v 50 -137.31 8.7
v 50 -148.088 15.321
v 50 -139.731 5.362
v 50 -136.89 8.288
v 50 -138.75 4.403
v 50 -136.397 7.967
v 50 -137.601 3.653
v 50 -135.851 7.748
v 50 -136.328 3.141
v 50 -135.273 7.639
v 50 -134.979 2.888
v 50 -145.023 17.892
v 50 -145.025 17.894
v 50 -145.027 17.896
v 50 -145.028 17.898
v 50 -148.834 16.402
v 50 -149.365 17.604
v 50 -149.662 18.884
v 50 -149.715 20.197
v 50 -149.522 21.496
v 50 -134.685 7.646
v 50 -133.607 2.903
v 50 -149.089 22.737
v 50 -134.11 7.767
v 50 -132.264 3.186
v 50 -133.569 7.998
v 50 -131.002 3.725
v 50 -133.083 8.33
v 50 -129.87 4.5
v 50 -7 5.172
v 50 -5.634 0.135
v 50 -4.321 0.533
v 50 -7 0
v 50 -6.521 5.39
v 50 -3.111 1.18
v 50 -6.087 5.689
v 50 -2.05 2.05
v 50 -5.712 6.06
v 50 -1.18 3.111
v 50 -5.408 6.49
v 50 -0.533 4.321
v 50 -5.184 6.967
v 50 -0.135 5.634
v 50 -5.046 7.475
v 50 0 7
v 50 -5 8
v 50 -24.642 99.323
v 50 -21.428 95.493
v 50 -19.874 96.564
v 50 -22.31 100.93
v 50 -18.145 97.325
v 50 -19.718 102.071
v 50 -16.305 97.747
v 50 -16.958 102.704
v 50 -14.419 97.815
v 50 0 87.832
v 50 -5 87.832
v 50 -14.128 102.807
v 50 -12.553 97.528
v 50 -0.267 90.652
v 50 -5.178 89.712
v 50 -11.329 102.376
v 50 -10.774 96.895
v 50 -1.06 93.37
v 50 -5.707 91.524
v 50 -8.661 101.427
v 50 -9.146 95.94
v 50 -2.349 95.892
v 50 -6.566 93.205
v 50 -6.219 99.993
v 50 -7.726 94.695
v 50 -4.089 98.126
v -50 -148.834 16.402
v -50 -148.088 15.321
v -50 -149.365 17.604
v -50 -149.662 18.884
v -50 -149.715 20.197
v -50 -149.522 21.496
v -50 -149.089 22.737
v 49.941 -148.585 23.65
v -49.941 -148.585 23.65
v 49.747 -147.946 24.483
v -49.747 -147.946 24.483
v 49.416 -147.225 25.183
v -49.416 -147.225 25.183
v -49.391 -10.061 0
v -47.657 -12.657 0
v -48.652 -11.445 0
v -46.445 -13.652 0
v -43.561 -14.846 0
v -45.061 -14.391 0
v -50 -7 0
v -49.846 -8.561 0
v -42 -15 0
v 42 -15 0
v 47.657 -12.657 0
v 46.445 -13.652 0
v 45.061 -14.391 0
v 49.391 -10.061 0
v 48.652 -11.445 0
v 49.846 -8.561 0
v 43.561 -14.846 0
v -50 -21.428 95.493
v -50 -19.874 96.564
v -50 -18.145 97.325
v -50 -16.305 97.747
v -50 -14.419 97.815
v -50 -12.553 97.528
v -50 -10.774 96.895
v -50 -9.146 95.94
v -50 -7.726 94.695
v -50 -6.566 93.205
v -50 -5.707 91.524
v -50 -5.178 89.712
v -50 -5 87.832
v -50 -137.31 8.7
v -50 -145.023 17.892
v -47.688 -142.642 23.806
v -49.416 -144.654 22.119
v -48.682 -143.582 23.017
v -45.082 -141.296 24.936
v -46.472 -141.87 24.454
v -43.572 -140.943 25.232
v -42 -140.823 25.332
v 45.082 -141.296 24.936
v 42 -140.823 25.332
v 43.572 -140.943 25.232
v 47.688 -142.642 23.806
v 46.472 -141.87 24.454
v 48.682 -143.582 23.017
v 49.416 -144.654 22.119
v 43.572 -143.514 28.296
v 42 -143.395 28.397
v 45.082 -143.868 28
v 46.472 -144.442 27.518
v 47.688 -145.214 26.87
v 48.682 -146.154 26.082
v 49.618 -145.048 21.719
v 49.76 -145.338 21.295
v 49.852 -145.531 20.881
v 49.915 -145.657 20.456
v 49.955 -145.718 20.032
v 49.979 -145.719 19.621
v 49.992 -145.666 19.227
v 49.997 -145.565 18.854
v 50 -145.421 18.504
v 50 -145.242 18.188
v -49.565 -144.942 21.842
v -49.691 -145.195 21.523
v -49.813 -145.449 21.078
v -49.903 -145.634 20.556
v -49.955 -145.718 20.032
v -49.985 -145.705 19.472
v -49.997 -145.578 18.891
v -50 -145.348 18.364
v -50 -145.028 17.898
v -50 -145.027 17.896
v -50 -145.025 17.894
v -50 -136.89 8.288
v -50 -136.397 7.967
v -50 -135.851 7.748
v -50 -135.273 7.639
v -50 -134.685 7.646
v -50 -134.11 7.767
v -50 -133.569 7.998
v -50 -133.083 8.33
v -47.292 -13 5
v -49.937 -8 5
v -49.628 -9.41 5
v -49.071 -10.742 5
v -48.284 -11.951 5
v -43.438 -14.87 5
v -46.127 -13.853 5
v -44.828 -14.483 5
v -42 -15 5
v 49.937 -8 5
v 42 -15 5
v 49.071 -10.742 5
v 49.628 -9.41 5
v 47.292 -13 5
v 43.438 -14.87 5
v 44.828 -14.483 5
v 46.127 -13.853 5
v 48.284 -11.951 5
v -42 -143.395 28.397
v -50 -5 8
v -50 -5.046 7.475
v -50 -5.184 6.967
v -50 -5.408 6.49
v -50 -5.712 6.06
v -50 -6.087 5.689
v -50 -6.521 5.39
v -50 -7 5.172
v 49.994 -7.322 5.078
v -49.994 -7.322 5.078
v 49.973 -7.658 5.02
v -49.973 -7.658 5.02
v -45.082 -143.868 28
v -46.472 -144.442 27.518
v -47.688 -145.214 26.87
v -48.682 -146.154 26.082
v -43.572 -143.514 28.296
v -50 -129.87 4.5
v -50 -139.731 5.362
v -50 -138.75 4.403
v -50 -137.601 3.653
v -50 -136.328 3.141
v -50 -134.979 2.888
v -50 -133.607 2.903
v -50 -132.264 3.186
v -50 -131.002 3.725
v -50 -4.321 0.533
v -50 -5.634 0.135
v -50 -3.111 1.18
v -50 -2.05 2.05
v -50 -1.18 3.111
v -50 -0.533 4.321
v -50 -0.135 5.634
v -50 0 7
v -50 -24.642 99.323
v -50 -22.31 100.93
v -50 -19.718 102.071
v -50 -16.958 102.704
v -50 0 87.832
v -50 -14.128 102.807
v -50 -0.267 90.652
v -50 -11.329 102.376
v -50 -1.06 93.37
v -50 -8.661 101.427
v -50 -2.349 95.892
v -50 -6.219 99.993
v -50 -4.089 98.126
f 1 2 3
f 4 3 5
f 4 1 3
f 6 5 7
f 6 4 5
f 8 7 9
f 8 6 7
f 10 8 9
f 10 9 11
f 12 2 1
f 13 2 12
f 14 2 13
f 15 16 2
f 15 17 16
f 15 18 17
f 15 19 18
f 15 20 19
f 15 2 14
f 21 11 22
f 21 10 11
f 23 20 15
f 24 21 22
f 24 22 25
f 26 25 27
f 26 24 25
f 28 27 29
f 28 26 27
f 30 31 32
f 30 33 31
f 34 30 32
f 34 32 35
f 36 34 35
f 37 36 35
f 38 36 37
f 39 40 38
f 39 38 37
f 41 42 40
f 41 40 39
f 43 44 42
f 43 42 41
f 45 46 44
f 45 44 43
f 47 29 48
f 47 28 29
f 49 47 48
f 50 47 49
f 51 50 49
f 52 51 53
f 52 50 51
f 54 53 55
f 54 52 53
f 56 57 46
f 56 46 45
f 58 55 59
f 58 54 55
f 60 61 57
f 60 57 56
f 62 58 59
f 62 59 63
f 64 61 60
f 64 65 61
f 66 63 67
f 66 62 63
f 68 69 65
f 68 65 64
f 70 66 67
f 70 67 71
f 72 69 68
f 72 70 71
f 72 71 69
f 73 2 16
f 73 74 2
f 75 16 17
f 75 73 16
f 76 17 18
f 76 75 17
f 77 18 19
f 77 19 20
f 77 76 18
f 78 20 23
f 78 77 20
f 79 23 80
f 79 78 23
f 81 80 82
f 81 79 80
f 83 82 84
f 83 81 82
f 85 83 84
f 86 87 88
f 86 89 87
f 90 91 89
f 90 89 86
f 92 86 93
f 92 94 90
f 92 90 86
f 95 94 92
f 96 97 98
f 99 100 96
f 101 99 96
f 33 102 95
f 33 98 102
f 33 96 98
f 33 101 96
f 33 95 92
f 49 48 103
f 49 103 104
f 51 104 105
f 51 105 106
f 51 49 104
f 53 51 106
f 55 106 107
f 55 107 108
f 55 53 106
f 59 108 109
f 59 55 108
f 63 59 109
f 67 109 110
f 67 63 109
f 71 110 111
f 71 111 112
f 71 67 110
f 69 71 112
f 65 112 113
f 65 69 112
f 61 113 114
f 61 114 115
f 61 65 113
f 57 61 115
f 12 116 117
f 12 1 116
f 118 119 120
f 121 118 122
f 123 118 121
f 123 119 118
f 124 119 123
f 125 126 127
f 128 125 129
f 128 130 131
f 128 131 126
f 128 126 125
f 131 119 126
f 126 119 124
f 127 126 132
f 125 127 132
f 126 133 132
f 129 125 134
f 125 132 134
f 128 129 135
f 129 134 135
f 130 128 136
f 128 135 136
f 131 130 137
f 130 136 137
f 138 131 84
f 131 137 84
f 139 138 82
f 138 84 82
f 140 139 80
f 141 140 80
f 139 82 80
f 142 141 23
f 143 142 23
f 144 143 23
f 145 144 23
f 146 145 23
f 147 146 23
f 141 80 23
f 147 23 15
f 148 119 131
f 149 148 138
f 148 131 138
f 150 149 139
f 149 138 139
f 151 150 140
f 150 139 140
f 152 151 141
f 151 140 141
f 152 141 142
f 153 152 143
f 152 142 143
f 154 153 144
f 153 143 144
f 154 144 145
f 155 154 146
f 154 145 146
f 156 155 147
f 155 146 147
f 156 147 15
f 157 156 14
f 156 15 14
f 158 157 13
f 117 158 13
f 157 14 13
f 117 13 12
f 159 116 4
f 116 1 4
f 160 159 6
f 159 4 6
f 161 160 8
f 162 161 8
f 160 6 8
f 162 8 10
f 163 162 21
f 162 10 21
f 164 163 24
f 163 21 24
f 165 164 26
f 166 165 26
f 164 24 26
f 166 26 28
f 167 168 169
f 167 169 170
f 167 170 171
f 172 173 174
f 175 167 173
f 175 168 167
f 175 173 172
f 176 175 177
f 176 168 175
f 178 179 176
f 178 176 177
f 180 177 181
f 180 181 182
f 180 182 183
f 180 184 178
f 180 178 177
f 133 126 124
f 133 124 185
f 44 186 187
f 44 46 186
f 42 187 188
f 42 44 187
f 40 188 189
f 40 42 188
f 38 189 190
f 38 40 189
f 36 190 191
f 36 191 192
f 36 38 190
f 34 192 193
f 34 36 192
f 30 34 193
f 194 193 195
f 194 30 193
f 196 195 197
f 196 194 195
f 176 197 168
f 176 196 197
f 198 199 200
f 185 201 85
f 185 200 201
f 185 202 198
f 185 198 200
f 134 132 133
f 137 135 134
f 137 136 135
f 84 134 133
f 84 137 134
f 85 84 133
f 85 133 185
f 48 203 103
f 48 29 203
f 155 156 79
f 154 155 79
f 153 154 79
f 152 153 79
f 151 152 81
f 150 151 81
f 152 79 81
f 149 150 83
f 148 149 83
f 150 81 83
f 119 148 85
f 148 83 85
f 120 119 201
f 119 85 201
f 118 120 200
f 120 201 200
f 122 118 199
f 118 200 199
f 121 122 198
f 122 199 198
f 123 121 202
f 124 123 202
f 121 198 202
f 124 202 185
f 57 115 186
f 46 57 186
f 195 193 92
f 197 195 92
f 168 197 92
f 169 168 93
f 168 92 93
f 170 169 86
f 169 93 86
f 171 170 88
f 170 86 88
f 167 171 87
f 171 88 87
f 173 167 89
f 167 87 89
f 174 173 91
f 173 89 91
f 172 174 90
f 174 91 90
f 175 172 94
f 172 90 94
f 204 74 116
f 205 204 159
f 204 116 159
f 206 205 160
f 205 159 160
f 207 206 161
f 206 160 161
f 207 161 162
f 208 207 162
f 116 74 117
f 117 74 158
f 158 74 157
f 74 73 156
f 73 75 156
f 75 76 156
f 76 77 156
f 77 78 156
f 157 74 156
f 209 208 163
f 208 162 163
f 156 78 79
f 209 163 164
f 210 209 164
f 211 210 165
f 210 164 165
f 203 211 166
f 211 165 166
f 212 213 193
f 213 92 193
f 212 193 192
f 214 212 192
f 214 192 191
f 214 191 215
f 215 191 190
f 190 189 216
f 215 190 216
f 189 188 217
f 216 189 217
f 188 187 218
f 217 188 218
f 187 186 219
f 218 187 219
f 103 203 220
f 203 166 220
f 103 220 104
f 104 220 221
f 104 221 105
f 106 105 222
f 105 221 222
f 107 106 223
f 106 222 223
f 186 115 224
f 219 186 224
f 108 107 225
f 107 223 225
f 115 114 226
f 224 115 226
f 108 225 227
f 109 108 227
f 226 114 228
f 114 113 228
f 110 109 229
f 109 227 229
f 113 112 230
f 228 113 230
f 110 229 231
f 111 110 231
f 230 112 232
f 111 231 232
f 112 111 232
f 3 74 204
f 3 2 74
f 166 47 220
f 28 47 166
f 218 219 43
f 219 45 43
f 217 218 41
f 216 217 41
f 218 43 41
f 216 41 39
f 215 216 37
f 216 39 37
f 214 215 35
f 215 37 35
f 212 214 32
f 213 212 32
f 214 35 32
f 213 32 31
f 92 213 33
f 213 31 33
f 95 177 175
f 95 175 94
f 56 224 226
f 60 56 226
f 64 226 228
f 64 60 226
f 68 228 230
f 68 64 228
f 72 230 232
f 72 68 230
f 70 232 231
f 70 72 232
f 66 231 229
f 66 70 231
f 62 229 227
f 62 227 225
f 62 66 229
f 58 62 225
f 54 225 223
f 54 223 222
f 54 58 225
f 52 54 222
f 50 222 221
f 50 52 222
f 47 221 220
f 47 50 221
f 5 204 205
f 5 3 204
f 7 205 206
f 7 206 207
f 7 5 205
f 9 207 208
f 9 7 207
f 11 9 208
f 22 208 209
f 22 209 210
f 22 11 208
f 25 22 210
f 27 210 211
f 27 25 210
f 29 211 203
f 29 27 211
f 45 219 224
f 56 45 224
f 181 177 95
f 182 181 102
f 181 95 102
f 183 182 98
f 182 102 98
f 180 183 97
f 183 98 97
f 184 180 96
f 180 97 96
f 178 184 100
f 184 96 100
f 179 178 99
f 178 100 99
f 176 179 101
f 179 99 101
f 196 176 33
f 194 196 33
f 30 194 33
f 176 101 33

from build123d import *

# Parameters (mm, degrees)
F1_DEPTH = 50
F2_R     = 7
F3_R     = 3
F4_R     = 7.99999


# Not quite as in the source:
# - a fillet or chamfer is up to 0.001 mm smaller than in the source, because OpenCascade refuses the exact size


with BuildPart() as f1:
    # F0 (on Right) → F1 (new body, symmetric)
    with BuildSketch(Plane.YZ):
        with BuildLine():
            Line((-152.5870774385, 20.6831999642), (-135.231811977, 0))
            Line((-135.231811977, 0), (-21.4278760969, 95.4928406235))
            ThreePointArc((-21.4278760969, 95.4928406235), (-10.7738173826, 96.8954740627), (-5, 87.8323961924))
            Line((-5, 87.8323961924), (-5, 5))
            Line((-5, 5), (-15, 5))
            Line((-15, 5), (-15, 0))
            Line((-15, 0), (0, 0))
            Line((0, 0), (0, 87.8323961924))
            ThreePointArc((0, 87.8323961924), (-8.6607260739, 101.4270129979), (-24.6418141453, 99.3230628391))
            Line((-24.6418141453, 99.3230628391), (-135.381572253, 6.4013726543))
            Line((-135.381572253, 6.4013726543), (-146.9517492273, 20.1901726305))
            Line((-146.9517492273, 20.1901726305), (-140.8233936824, 25.332473508))
            Line((-140.8233936824, 25.332473508), (-143.3945441211, 28.3966512805))
            Line((-143.3945441211, 28.3966512805), (-152.5870774385, 20.6831999642))
        make_face()
    extrude(amount=F1_DEPTH, both=True)

    # F2
    f2_edges = [f1.edges().sort_by_distance(p)[0] for p in [
        (0, -135.231812, 0),
        (0, -152.587077, 20.6832),
        (0, 0, 0),
    ]]
    fillet(f2_edges, radius=F2_R)

    # F3
    f3_edges = [f1.edges().sort_by_distance(p)[0] for p in [
        (0, -146.951749, 20.190173),
        (0, -135.381572, 6.401373),
        (0, -5, 5),
    ]]
    fillet(f3_edges, radius=F3_R)

    # F4 (radius 8 in the source; OpenCascade refuses exactly that, so slightly less here)
    f4_edges = [f1.edges().sort_by_distance(p)[0] for p in [
        (50, -142.108969, 26.864562),
        (-50, -142.108969, 26.864562),
        (50, -15, 2.5),
        (-50, -15, 2.5),
    ]]
    fillet(f4_edges, radius=F4_R)


solid = f1.part
